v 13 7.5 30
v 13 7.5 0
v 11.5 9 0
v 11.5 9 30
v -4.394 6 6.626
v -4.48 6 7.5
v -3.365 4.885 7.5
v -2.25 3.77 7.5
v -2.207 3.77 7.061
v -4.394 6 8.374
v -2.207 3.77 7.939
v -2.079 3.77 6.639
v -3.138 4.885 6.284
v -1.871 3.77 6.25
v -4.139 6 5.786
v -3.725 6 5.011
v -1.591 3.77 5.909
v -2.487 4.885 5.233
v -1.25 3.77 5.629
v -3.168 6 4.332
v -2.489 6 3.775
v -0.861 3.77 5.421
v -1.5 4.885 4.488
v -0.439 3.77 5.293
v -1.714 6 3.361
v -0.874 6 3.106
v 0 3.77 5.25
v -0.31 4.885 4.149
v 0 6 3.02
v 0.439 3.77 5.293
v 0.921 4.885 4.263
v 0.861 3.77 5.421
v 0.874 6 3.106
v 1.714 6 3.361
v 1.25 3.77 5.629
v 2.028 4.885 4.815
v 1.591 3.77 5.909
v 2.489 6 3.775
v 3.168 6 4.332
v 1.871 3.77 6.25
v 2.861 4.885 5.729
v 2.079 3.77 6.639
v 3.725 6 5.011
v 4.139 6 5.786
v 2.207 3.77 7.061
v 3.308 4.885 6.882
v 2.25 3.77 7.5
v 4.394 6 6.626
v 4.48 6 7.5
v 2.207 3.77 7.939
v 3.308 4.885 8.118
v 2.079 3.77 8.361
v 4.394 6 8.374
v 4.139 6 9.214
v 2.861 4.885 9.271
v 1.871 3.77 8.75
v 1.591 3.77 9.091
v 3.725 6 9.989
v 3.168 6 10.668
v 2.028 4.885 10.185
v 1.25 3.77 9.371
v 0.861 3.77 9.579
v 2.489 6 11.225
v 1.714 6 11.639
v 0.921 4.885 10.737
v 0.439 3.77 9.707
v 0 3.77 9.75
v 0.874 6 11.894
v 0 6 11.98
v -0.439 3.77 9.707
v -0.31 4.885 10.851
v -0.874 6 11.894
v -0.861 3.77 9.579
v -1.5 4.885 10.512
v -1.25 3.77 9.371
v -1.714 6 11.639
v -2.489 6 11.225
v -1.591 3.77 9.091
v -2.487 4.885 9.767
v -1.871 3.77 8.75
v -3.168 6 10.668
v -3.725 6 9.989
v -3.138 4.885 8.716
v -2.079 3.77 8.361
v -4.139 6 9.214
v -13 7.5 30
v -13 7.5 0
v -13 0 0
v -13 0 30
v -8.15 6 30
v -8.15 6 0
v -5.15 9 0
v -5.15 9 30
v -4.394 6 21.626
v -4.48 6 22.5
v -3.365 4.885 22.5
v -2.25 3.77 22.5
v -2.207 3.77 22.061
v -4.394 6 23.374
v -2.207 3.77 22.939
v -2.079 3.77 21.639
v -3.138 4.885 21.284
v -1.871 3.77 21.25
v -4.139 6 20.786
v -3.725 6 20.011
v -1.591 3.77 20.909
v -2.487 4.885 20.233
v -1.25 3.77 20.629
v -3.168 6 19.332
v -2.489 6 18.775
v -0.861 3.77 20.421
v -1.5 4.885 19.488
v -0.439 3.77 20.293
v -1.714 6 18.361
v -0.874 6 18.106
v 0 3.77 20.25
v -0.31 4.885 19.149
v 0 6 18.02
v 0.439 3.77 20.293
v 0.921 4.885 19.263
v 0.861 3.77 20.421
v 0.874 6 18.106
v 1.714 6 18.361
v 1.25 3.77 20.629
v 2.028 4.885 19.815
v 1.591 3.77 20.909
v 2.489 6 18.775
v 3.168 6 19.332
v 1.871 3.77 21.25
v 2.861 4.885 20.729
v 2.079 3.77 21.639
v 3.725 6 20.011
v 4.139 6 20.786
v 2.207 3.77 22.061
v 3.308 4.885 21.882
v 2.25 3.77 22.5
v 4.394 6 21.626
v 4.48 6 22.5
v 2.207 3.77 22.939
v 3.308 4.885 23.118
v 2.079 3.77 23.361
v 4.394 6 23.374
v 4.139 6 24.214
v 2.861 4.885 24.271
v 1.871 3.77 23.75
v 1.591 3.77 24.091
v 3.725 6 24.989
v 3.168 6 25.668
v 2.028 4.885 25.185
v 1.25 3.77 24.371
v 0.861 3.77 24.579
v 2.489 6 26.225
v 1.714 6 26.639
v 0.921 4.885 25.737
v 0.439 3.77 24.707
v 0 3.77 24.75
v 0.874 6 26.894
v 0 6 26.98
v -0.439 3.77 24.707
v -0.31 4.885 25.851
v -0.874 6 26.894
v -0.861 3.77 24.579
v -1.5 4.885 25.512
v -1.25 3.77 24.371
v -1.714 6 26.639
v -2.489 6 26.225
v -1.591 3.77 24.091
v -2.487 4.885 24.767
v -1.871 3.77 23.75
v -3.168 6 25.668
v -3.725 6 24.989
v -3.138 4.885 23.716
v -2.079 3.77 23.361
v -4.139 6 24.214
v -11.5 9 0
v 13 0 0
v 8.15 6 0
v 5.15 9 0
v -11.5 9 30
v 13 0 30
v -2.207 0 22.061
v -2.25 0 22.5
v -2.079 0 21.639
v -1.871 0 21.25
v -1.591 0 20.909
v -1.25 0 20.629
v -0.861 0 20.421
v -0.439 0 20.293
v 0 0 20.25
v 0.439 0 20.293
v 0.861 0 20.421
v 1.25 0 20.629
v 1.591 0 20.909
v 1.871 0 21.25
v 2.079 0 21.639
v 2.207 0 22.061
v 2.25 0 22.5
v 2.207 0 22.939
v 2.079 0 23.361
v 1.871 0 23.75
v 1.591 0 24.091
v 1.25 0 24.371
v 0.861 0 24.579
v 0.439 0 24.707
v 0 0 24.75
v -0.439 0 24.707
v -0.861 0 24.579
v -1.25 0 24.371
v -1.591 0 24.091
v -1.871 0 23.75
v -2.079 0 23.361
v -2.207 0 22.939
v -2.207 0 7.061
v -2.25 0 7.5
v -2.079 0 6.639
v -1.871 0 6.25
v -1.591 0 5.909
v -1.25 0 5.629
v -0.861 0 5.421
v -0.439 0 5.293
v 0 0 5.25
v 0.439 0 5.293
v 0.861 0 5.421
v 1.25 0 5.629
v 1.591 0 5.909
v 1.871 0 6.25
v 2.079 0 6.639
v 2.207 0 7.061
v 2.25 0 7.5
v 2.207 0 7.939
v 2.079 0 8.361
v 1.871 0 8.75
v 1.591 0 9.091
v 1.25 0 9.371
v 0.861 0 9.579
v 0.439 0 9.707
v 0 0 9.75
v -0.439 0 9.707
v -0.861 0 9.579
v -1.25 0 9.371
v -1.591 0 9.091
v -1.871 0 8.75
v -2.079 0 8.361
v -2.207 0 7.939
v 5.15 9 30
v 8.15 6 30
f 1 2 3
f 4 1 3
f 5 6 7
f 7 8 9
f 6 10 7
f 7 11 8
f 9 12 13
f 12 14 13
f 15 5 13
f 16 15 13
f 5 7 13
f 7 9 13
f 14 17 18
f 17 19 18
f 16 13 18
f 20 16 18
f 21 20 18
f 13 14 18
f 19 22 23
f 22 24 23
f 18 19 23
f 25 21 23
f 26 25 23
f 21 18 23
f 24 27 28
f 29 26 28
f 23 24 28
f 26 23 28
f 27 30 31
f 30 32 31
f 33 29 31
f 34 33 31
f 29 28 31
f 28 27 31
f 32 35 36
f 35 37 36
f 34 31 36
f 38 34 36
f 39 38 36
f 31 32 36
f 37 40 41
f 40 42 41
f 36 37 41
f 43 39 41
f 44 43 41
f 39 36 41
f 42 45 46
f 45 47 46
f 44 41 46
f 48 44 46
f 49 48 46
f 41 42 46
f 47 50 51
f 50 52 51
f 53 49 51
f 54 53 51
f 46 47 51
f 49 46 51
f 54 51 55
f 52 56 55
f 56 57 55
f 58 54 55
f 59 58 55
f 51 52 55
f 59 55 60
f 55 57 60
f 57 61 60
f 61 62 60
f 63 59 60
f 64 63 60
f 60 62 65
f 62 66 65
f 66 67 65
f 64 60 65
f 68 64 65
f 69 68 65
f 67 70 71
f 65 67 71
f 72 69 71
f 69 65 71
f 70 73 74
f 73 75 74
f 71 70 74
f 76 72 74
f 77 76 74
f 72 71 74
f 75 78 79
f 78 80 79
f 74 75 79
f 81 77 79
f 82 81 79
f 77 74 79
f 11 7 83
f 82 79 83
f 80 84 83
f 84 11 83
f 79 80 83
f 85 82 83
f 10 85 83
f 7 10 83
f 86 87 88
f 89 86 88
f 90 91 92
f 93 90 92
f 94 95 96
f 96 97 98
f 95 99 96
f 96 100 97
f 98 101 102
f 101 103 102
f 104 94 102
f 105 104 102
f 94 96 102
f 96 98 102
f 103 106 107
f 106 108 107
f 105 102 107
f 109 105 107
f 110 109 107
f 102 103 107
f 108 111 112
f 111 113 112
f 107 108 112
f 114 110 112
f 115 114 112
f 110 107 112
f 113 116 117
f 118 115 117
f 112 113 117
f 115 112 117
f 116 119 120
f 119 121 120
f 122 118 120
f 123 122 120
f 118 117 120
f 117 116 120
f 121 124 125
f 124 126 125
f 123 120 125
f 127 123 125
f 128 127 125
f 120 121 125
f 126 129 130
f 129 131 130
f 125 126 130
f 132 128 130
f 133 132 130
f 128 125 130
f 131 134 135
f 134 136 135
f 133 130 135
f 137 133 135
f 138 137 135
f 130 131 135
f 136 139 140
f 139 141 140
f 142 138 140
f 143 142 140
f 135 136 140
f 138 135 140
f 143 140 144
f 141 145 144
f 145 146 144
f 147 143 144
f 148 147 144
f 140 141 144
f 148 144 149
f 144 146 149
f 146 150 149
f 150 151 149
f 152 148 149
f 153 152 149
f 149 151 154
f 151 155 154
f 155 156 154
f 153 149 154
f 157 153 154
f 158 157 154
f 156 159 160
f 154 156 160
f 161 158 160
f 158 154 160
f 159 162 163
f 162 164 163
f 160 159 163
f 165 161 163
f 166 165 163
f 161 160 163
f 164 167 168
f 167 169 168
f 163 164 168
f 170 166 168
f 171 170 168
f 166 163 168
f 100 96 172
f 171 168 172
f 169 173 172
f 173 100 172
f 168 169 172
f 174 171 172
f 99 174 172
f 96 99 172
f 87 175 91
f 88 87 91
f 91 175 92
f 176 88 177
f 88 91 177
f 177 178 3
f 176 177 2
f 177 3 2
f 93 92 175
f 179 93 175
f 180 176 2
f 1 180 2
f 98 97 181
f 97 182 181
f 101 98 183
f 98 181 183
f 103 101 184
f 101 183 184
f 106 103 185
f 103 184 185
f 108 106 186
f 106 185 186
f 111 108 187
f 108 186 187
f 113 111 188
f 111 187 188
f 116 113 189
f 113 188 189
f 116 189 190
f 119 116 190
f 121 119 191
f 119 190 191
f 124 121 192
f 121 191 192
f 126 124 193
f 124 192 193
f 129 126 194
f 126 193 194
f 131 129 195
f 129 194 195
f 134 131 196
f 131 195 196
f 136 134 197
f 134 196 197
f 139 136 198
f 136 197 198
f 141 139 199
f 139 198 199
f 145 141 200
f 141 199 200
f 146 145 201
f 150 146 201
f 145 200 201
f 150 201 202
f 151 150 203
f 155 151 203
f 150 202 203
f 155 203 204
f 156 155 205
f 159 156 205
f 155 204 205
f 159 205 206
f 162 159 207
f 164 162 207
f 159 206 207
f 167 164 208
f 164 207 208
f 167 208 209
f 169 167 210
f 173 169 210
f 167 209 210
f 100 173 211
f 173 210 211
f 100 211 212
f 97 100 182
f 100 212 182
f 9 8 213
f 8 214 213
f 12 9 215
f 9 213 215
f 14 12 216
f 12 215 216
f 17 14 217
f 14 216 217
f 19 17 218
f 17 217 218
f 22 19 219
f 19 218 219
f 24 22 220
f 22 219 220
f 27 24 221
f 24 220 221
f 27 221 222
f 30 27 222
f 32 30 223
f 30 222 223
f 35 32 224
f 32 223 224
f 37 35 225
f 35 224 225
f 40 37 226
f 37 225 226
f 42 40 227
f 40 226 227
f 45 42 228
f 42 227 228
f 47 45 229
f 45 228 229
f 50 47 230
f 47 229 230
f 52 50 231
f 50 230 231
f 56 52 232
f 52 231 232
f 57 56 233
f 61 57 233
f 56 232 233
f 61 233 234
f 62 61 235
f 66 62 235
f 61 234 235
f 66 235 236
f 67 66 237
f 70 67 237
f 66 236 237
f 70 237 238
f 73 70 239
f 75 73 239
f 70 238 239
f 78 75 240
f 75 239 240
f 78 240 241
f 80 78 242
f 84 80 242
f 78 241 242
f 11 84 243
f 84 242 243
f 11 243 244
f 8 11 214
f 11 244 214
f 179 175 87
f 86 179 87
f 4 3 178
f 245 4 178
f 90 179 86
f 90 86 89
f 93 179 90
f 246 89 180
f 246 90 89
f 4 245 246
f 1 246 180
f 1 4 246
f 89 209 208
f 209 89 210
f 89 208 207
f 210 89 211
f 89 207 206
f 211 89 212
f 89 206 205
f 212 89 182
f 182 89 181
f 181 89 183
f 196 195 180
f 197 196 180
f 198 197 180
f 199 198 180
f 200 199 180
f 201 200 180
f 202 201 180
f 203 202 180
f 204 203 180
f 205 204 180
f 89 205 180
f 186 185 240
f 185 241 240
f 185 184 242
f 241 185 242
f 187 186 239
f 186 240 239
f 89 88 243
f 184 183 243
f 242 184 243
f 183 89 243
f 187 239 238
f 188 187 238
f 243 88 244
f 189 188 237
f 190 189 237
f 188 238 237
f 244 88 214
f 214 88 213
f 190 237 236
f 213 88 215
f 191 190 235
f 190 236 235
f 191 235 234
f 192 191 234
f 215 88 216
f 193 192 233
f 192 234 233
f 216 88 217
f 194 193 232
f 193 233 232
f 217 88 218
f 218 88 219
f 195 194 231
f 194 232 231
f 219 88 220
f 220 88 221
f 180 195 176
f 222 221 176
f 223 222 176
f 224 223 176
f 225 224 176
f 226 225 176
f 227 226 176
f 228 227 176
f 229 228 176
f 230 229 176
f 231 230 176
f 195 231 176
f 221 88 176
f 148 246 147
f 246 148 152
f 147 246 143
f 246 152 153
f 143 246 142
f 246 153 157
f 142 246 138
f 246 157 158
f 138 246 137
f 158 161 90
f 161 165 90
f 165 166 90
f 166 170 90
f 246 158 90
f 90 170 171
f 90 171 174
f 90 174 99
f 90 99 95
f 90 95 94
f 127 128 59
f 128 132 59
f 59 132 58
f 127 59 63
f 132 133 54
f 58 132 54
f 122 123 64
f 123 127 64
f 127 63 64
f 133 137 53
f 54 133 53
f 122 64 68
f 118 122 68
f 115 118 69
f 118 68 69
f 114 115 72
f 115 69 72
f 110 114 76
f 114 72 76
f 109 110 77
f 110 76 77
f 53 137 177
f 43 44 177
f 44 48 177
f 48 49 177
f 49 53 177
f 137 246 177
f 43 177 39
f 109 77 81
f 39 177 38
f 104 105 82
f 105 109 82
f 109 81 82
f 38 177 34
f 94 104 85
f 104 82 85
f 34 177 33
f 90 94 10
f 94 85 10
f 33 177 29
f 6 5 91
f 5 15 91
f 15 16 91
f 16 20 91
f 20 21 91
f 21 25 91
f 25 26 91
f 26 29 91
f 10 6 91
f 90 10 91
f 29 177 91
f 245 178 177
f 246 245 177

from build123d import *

# Parameters (mm, degrees)
BOSS_EXTRUDE1_DEPTH                                  = 30
CSK_FOR_M4_HEX_SOCKET_COUNTERSUNK_CAP_SC_D           = 4.5
CSK_FOR_M4_HEX_SOCKET_COUNTERSUNK_CAP_SC_CSINK_D     = 8.96
CSK_FOR_M4_HEX_SOCKET_COUNTERSUNK_CAP_SC_CSINK_ANGLE = 90


with BuildPart() as part:
    # Sketch2 → Boss-Extrude1 (new body)
    with BuildSketch(Plane.XY):
        Polygon((-13, 0), (13, 0), (13, 7.5), (11.5, 9), (5.15, 9), (8.15, 6), (-8.15, 6), (-5.15, 9), (-11.5, 9), (-13, 7.5), align=None)
    extrude(amount=BOSS_EXTRUDE1_DEPTH)

    # CSK for M4 Hex Socket Countersunk Cap Screw1 (through all)
    with Locations(Plane(origin=(0, 6, 0), x_dir=(1, 0, 0), z_dir=(0, 1, 0))):
        with Locations((0, -22.5), (0, -7.5)):
            CounterSinkHole(CSK_FOR_M4_HEX_SOCKET_COUNTERSUNK_CAP_SC_D / 2, CSK_FOR_M4_HEX_SOCKET_COUNTERSUNK_CAP_SC_CSINK_D / 2, counter_sink_angle=CSK_FOR_M4_HEX_SOCKET_COUNTERSUNK_CAP_SC_CSINK_ANGLE)


solid = part.part
